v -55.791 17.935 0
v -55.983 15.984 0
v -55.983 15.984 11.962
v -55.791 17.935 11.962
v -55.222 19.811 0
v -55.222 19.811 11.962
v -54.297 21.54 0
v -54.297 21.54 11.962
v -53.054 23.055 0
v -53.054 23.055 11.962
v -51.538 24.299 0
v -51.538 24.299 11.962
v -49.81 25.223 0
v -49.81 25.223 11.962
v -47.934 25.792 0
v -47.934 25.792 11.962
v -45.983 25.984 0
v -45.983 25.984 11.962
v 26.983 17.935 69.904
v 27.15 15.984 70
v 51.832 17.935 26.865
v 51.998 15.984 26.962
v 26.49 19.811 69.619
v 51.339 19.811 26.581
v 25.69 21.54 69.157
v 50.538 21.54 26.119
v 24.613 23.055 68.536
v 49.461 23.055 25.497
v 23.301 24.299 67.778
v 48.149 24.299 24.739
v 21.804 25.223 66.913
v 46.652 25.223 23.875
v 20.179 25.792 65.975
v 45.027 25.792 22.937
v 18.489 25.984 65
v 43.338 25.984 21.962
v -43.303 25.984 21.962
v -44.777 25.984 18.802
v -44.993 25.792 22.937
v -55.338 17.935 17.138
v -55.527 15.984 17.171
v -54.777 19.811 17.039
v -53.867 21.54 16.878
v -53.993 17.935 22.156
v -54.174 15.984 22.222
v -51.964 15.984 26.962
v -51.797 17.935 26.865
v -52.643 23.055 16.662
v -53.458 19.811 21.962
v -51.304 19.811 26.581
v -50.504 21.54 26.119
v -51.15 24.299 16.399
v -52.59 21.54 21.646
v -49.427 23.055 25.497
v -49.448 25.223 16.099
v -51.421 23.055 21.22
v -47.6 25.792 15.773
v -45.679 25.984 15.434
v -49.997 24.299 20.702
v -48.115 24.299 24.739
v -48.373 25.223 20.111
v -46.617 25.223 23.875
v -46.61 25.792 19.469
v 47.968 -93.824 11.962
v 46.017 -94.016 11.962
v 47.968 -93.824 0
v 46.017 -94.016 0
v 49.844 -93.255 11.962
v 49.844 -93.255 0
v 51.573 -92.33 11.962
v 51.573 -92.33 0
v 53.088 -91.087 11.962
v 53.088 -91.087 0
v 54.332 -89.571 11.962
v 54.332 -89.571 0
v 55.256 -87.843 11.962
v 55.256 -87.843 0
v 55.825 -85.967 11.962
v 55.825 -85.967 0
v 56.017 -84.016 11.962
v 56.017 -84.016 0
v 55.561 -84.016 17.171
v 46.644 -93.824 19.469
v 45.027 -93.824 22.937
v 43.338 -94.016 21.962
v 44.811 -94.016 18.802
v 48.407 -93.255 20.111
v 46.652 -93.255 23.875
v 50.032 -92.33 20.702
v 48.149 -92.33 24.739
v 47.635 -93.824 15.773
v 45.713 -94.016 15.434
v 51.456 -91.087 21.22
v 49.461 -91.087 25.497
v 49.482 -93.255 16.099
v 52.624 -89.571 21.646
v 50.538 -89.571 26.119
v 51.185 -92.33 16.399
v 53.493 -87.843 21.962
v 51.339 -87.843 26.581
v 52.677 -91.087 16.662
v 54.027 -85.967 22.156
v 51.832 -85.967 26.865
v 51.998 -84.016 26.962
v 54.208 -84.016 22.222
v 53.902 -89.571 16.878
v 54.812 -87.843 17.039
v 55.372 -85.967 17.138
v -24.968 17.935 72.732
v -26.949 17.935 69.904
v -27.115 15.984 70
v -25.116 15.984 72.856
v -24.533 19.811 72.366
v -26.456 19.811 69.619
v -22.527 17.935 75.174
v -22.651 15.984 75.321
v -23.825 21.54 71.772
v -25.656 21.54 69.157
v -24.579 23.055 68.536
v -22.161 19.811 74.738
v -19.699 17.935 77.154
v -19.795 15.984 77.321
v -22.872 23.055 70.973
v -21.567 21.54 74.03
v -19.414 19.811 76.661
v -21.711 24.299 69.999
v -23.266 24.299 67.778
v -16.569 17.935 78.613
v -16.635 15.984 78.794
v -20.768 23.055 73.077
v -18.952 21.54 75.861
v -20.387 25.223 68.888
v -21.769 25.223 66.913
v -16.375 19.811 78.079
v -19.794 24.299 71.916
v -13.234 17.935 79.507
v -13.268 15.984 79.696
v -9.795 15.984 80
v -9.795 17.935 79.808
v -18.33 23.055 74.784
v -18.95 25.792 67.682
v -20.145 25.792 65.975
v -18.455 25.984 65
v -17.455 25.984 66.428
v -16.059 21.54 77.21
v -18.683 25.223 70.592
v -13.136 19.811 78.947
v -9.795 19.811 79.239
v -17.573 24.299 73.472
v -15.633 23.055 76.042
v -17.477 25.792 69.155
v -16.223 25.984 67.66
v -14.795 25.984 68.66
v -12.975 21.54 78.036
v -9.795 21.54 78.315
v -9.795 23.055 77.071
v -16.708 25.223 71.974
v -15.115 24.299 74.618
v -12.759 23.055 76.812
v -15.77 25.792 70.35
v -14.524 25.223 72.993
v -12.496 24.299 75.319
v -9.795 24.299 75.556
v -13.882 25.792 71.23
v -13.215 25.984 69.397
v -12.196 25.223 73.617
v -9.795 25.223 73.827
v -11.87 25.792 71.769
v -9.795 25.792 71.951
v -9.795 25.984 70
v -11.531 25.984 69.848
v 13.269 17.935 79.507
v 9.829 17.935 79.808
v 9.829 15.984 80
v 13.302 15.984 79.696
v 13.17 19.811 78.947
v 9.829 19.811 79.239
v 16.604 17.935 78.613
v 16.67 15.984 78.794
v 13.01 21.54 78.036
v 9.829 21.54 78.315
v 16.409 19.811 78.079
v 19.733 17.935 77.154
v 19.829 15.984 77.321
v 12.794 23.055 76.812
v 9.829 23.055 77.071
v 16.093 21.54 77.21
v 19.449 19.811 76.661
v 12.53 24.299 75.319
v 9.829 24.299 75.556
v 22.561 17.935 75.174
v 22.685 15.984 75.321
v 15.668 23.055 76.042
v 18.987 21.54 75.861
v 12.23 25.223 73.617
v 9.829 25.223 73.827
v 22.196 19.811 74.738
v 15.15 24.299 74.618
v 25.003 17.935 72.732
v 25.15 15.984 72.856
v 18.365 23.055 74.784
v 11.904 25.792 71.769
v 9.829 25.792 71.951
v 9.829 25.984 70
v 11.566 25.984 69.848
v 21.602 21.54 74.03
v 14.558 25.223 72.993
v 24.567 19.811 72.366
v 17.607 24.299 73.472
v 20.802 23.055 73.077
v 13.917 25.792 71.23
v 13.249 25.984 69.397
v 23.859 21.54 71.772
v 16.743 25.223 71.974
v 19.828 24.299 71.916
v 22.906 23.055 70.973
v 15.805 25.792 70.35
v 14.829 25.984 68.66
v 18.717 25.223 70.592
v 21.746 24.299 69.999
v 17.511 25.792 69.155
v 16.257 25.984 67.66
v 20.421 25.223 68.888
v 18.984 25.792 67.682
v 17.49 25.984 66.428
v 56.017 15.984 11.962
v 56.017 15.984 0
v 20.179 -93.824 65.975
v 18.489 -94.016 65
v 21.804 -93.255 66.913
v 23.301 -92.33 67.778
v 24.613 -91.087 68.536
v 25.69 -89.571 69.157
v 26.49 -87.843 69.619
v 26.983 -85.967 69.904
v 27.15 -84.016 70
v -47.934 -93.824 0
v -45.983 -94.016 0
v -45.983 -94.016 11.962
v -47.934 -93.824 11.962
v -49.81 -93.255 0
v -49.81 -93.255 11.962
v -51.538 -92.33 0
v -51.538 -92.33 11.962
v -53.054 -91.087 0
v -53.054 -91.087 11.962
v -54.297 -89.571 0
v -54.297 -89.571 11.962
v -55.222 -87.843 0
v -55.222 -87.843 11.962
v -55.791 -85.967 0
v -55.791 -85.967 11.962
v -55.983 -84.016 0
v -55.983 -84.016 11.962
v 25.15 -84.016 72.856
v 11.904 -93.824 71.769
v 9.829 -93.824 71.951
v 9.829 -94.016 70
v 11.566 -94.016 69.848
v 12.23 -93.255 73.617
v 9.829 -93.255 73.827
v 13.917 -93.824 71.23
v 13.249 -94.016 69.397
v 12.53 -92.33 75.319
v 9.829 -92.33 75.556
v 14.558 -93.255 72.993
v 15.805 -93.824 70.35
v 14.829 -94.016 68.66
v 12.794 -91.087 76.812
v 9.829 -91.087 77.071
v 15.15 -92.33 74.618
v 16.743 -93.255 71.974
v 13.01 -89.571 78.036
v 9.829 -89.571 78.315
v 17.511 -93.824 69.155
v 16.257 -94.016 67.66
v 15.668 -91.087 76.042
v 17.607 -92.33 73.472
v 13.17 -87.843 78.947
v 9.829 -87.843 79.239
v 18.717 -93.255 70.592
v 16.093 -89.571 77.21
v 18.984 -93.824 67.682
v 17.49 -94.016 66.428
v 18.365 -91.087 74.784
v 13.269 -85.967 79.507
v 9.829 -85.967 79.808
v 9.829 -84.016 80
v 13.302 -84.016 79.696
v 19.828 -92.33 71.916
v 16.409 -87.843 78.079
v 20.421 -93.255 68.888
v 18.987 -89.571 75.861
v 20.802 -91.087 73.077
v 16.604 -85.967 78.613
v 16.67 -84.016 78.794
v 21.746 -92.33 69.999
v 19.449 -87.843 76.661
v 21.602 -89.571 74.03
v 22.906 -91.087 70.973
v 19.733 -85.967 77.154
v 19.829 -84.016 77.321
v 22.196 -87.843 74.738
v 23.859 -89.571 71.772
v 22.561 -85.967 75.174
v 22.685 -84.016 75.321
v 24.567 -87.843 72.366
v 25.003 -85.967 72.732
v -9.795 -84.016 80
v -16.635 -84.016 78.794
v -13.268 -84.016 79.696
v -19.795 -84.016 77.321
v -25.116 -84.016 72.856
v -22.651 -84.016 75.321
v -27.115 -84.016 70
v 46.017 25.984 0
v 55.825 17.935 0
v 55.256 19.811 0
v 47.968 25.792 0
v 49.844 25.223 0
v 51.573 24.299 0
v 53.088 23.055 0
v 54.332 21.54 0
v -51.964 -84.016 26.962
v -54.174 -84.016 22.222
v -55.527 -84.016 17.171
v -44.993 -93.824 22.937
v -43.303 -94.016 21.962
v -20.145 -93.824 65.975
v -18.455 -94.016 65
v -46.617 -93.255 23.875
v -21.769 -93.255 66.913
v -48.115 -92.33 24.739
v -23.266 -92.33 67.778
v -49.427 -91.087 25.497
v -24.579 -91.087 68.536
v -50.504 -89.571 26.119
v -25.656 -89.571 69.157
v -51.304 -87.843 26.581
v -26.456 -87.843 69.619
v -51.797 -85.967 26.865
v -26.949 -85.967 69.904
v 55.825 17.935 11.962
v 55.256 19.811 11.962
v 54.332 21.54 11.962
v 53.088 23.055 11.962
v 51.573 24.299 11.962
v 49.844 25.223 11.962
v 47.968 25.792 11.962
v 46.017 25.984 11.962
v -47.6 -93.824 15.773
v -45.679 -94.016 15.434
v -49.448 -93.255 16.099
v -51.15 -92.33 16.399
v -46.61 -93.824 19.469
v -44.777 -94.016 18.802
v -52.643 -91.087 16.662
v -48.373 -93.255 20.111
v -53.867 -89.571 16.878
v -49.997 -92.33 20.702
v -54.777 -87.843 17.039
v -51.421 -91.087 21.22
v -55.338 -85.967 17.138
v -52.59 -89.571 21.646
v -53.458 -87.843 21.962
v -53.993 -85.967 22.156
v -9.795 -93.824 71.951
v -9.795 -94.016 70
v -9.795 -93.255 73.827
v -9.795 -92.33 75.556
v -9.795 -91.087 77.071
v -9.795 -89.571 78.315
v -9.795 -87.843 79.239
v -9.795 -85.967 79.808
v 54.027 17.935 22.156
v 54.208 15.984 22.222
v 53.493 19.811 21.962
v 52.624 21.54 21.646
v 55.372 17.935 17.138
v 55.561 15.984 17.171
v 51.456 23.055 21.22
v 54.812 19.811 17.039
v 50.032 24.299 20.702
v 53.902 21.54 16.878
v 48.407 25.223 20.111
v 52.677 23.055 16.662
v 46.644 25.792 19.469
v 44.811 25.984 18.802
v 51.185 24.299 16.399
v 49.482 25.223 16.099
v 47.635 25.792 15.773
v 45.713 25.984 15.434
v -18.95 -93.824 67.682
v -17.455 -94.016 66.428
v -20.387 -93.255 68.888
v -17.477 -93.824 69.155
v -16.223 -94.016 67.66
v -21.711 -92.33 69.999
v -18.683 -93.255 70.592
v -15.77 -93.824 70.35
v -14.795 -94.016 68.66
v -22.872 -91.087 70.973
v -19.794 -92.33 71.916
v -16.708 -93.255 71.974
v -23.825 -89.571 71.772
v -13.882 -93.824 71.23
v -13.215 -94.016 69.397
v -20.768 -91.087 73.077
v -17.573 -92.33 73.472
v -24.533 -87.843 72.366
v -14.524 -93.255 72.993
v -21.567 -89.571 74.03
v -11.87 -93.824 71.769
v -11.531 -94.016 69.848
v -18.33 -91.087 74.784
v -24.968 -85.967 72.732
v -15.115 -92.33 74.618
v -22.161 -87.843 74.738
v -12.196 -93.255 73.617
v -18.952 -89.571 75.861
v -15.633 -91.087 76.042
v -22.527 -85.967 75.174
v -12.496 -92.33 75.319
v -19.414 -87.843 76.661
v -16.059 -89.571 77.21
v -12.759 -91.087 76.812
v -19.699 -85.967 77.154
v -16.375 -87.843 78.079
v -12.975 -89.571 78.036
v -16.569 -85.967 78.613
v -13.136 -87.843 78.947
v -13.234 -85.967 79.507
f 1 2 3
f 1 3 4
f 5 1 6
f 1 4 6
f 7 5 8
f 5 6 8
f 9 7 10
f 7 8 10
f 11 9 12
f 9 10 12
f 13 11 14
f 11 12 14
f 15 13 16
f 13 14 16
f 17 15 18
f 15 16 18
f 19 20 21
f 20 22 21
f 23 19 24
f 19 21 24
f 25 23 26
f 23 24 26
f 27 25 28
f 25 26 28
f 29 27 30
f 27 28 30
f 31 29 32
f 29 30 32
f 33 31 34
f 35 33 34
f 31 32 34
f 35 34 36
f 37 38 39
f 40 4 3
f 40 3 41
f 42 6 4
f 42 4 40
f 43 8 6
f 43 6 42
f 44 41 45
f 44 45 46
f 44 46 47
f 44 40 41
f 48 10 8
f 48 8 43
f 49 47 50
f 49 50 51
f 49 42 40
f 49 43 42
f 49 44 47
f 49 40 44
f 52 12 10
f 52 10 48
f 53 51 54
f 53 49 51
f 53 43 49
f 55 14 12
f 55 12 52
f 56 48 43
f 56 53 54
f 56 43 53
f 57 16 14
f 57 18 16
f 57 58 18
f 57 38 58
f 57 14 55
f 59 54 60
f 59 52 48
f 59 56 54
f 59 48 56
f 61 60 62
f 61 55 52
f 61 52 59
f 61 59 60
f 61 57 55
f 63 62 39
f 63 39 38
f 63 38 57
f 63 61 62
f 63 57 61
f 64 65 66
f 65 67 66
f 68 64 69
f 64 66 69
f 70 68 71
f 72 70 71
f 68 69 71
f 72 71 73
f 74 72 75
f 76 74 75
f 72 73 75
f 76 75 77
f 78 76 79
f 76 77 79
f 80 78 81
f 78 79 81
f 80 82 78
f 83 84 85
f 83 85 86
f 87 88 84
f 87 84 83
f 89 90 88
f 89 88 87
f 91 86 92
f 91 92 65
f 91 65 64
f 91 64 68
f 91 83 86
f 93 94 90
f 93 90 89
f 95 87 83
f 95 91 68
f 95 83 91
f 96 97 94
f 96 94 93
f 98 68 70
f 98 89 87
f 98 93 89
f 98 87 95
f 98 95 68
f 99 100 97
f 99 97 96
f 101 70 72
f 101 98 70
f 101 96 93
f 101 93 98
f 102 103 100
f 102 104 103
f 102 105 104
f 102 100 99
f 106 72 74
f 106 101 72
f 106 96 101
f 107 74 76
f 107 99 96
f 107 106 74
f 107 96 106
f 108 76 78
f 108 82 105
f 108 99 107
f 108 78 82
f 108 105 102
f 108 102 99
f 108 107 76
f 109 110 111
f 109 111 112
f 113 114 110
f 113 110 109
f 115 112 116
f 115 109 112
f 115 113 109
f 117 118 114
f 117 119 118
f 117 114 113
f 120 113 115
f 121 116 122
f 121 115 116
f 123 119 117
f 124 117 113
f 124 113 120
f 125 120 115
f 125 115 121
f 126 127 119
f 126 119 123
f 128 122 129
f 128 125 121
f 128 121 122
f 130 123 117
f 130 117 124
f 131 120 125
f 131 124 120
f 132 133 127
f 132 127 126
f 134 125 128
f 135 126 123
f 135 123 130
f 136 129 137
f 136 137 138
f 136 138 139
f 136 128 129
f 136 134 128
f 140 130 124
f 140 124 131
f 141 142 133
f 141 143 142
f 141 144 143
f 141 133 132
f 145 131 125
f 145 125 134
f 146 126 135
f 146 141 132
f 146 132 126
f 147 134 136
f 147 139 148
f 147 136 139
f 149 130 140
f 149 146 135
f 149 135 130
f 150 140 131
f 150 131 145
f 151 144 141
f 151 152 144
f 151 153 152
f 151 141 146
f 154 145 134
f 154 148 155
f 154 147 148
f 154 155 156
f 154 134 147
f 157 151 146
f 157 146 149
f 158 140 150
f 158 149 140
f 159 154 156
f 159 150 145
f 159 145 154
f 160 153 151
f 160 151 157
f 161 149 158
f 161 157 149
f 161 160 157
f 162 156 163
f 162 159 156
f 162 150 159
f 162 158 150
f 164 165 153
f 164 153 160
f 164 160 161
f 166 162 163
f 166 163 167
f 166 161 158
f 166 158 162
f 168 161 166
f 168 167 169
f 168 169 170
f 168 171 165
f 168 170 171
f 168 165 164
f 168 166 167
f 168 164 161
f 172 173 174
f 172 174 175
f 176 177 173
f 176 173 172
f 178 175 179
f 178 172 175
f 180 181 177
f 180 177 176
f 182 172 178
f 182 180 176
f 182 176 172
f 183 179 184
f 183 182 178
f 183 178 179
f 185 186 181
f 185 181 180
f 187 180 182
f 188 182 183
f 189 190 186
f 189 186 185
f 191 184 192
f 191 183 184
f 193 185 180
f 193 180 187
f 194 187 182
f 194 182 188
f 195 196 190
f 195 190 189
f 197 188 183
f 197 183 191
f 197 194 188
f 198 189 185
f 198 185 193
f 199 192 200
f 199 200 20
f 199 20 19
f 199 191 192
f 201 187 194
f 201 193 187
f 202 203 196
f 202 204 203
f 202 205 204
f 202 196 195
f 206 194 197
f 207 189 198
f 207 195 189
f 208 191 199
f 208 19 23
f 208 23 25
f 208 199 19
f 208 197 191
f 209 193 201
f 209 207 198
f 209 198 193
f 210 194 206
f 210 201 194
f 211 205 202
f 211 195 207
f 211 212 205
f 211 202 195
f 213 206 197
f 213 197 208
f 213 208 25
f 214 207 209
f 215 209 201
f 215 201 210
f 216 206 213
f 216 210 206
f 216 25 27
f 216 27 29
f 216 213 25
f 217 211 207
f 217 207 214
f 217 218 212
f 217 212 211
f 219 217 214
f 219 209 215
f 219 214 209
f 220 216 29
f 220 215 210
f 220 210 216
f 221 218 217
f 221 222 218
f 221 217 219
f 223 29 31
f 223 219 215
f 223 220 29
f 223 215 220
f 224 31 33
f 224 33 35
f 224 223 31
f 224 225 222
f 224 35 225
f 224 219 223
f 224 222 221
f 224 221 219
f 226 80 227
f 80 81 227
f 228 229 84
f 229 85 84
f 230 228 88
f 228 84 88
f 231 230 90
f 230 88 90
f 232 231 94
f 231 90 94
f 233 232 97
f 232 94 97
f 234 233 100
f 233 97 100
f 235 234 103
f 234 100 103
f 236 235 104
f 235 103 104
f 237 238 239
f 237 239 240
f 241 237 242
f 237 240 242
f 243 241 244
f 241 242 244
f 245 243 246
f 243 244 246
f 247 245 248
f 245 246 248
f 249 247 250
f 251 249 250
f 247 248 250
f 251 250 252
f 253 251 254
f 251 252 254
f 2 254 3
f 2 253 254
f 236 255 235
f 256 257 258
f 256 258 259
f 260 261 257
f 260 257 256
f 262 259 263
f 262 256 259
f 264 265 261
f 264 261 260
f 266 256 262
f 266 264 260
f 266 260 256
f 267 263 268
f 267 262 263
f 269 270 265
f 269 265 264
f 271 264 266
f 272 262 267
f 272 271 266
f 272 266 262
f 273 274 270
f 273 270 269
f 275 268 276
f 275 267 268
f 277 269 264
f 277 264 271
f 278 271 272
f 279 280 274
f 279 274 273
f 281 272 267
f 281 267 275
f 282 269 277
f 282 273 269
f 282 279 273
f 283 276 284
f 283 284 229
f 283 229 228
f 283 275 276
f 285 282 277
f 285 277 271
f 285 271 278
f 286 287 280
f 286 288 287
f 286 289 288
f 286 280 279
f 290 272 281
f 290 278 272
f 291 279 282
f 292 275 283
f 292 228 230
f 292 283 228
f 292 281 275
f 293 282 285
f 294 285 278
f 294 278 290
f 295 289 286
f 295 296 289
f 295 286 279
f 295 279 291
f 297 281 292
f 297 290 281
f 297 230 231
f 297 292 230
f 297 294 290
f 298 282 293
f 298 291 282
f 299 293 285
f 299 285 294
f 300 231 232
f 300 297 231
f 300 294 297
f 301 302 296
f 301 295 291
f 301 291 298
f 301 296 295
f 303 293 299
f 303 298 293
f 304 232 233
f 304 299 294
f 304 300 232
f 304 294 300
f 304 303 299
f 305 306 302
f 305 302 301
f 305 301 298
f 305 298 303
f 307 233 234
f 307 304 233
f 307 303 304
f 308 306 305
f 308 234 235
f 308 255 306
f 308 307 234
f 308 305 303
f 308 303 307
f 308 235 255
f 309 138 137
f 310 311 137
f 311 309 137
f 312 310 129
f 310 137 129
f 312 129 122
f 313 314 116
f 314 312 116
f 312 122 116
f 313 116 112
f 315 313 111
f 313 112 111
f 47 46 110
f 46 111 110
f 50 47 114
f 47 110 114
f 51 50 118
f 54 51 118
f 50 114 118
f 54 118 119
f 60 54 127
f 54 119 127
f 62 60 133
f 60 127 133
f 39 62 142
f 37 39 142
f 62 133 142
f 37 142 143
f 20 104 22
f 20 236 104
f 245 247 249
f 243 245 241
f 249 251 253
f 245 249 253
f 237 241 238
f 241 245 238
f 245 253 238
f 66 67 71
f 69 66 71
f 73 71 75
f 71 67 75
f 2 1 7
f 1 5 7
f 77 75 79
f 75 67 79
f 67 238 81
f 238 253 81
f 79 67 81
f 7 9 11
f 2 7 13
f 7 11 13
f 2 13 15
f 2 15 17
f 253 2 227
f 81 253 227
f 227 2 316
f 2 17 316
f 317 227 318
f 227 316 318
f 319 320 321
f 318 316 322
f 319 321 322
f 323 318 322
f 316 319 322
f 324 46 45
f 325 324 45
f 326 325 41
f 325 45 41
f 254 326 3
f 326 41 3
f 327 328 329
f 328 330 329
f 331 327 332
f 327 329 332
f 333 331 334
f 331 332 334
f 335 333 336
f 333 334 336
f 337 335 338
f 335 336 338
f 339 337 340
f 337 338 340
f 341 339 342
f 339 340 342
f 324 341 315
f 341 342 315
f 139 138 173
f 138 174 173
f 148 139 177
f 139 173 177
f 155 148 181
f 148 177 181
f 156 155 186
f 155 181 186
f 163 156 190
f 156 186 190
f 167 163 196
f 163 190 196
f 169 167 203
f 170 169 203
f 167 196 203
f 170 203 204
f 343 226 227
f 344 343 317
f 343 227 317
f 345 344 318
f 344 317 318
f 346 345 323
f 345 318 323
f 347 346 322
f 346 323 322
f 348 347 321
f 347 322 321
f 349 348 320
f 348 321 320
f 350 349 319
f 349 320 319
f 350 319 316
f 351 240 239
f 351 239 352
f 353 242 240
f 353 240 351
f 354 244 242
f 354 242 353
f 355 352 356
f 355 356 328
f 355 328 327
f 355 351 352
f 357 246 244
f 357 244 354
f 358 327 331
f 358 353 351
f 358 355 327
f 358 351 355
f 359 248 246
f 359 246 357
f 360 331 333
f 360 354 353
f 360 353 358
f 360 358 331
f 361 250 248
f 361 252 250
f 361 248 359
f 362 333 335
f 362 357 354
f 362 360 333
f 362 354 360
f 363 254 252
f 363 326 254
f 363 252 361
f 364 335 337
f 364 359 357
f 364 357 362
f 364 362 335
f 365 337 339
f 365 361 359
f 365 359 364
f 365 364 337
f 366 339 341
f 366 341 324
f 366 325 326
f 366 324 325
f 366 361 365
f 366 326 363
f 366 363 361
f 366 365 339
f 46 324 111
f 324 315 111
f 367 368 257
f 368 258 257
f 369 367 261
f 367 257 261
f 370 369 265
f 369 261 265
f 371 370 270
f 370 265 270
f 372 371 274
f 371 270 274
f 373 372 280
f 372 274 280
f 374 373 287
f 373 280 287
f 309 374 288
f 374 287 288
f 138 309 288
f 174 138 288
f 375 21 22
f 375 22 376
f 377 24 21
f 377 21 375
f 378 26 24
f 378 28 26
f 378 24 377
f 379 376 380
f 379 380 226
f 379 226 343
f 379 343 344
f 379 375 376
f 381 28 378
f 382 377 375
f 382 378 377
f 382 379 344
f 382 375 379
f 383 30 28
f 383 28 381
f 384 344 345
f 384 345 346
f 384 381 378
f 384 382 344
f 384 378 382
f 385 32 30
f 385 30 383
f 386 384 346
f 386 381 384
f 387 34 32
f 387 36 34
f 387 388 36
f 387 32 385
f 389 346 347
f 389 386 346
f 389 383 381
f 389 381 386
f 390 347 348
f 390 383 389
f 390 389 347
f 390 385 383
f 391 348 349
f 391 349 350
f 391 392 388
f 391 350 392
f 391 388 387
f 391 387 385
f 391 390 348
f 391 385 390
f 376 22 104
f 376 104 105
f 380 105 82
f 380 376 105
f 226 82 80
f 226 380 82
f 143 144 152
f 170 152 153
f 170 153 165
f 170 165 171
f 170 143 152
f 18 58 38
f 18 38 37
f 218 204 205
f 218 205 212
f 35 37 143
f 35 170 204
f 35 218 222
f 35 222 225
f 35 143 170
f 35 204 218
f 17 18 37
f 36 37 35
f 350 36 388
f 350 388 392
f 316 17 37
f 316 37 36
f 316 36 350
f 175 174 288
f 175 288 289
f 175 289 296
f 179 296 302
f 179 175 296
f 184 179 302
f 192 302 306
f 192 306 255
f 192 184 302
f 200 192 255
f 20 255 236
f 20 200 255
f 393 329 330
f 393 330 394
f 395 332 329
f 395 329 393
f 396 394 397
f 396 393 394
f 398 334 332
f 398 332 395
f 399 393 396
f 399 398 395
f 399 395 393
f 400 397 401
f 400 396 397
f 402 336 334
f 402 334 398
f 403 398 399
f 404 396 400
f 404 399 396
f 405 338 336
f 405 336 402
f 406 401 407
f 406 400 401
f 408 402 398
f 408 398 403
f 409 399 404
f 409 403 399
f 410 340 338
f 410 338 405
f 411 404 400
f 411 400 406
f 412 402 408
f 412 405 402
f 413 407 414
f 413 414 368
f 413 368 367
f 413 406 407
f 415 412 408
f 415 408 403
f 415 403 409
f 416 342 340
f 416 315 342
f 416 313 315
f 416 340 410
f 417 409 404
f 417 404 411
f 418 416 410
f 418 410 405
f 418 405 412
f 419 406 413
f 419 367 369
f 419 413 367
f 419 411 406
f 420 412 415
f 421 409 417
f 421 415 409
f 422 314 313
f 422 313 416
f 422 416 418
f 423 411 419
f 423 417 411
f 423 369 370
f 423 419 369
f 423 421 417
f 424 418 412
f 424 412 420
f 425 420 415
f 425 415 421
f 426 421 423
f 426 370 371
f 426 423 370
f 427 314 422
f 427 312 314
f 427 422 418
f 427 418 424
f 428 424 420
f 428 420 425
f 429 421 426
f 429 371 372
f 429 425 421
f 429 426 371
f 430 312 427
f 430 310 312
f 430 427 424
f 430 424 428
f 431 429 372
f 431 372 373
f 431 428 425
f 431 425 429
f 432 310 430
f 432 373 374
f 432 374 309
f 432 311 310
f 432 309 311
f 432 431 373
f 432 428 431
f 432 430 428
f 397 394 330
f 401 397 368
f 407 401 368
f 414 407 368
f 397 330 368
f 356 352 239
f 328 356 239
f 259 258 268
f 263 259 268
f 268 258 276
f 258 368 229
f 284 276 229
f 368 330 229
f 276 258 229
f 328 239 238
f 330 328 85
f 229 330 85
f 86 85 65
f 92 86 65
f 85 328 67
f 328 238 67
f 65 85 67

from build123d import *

# Parameters (mm, degrees)
F0_W     = 112
F0_H     = 120
F1_DEPTH = 20
F2_DEPTH = 60
F3_SIZE2 = 34.641006
F3_SIZE  = 59.99999
F4_SIZE2 = 34.641006
F4_SIZE  = 59.99999
F5_R     = 20
F7_R     = 30
F8_R     = 10


# Not quite as in the source:
# - a fillet or chamfer is up to 0.001 mm smaller than in the source, because OpenCascade refuses the exact size


with BuildPart() as f1:
    # F0 (on Top) → F1 (new body)
    with BuildSketch(Plane.XY):
        with Locations((0.0172033906, -34.0157587473)):
            Rectangle(F0_W, F0_H)
    extrude(amount=F1_DEPTH)


with BuildPart() as f2:
    # F2 (new): a face of the model
    f2_faces = [f1.part.faces().sort_by_distance(p)[0] for p in [
        (0.0172033906, -34.0157587473, 20),
    ]]
    extrude(f2_faces, amount=F2_DEPTH)

    # F3 (size 60 and 34.6410161514 in the source; OpenCascade refuses exactly that, so slightly less here)
    f3_edges = [f2.edges().sort_by_distance(p)[0] for p in [
        (56.017203, -34.015759, 80),
    ]]
    f3_side = f2.faces().sort_by_distance((56.017203, -34.015759, 50))[0]
    chamfer(f3_edges, length=F3_SIZE, length2=F3_SIZE2, reference=f3_side)

    # F4 (size 60 and 34.6410161514 in the source; OpenCascade refuses exactly that, so slightly less here)
    f4_edges = [f2.edges().sort_by_distance(p)[0] for p in [
        (-55.982797, -34.015759, 80),
    ]]
    f4_side = f2.faces().sort_by_distance((-55.982797, -34.015759, 50))[0]
    chamfer(f4_edges, length=F4_SIZE, length2=F4_SIZE2, reference=f4_side)

    # F5
    f5_edges = [f2.edges().sort_by_distance(p)[0] for p in [
        (21.376197, -34.015759, 80),
        (-21.341791, -34.015759, 80),
    ]]
    fillet(f5_edges, radius=F5_R)


with BuildPart() as f1_1:
    add(f1.part)

    # F6: union F2
    add(f2.part)

    # F7
    f7_edges = [f1_1.edges().sort_by_distance(p)[0] for p in [
        (-55.982797, -34.015759, 20),
        (56.017203, -34.015759, 20),
    ]]
    fillet(f7_edges, radius=F7_R)

    # F8
    f8_edges = [f1_1.edges().sort_by_distance(p)[0] for p in [
        (-39.539426, -94.015759, 48.480766),
        (-55.982797, -94.015759, 5.980768),
        (-39.539426, 25.984241, 48.480766),
        (-55.982797, 25.984241, 5.980768),
    ]]
    fillet(f8_edges, radius=F8_R)


solid = f1_1.part
